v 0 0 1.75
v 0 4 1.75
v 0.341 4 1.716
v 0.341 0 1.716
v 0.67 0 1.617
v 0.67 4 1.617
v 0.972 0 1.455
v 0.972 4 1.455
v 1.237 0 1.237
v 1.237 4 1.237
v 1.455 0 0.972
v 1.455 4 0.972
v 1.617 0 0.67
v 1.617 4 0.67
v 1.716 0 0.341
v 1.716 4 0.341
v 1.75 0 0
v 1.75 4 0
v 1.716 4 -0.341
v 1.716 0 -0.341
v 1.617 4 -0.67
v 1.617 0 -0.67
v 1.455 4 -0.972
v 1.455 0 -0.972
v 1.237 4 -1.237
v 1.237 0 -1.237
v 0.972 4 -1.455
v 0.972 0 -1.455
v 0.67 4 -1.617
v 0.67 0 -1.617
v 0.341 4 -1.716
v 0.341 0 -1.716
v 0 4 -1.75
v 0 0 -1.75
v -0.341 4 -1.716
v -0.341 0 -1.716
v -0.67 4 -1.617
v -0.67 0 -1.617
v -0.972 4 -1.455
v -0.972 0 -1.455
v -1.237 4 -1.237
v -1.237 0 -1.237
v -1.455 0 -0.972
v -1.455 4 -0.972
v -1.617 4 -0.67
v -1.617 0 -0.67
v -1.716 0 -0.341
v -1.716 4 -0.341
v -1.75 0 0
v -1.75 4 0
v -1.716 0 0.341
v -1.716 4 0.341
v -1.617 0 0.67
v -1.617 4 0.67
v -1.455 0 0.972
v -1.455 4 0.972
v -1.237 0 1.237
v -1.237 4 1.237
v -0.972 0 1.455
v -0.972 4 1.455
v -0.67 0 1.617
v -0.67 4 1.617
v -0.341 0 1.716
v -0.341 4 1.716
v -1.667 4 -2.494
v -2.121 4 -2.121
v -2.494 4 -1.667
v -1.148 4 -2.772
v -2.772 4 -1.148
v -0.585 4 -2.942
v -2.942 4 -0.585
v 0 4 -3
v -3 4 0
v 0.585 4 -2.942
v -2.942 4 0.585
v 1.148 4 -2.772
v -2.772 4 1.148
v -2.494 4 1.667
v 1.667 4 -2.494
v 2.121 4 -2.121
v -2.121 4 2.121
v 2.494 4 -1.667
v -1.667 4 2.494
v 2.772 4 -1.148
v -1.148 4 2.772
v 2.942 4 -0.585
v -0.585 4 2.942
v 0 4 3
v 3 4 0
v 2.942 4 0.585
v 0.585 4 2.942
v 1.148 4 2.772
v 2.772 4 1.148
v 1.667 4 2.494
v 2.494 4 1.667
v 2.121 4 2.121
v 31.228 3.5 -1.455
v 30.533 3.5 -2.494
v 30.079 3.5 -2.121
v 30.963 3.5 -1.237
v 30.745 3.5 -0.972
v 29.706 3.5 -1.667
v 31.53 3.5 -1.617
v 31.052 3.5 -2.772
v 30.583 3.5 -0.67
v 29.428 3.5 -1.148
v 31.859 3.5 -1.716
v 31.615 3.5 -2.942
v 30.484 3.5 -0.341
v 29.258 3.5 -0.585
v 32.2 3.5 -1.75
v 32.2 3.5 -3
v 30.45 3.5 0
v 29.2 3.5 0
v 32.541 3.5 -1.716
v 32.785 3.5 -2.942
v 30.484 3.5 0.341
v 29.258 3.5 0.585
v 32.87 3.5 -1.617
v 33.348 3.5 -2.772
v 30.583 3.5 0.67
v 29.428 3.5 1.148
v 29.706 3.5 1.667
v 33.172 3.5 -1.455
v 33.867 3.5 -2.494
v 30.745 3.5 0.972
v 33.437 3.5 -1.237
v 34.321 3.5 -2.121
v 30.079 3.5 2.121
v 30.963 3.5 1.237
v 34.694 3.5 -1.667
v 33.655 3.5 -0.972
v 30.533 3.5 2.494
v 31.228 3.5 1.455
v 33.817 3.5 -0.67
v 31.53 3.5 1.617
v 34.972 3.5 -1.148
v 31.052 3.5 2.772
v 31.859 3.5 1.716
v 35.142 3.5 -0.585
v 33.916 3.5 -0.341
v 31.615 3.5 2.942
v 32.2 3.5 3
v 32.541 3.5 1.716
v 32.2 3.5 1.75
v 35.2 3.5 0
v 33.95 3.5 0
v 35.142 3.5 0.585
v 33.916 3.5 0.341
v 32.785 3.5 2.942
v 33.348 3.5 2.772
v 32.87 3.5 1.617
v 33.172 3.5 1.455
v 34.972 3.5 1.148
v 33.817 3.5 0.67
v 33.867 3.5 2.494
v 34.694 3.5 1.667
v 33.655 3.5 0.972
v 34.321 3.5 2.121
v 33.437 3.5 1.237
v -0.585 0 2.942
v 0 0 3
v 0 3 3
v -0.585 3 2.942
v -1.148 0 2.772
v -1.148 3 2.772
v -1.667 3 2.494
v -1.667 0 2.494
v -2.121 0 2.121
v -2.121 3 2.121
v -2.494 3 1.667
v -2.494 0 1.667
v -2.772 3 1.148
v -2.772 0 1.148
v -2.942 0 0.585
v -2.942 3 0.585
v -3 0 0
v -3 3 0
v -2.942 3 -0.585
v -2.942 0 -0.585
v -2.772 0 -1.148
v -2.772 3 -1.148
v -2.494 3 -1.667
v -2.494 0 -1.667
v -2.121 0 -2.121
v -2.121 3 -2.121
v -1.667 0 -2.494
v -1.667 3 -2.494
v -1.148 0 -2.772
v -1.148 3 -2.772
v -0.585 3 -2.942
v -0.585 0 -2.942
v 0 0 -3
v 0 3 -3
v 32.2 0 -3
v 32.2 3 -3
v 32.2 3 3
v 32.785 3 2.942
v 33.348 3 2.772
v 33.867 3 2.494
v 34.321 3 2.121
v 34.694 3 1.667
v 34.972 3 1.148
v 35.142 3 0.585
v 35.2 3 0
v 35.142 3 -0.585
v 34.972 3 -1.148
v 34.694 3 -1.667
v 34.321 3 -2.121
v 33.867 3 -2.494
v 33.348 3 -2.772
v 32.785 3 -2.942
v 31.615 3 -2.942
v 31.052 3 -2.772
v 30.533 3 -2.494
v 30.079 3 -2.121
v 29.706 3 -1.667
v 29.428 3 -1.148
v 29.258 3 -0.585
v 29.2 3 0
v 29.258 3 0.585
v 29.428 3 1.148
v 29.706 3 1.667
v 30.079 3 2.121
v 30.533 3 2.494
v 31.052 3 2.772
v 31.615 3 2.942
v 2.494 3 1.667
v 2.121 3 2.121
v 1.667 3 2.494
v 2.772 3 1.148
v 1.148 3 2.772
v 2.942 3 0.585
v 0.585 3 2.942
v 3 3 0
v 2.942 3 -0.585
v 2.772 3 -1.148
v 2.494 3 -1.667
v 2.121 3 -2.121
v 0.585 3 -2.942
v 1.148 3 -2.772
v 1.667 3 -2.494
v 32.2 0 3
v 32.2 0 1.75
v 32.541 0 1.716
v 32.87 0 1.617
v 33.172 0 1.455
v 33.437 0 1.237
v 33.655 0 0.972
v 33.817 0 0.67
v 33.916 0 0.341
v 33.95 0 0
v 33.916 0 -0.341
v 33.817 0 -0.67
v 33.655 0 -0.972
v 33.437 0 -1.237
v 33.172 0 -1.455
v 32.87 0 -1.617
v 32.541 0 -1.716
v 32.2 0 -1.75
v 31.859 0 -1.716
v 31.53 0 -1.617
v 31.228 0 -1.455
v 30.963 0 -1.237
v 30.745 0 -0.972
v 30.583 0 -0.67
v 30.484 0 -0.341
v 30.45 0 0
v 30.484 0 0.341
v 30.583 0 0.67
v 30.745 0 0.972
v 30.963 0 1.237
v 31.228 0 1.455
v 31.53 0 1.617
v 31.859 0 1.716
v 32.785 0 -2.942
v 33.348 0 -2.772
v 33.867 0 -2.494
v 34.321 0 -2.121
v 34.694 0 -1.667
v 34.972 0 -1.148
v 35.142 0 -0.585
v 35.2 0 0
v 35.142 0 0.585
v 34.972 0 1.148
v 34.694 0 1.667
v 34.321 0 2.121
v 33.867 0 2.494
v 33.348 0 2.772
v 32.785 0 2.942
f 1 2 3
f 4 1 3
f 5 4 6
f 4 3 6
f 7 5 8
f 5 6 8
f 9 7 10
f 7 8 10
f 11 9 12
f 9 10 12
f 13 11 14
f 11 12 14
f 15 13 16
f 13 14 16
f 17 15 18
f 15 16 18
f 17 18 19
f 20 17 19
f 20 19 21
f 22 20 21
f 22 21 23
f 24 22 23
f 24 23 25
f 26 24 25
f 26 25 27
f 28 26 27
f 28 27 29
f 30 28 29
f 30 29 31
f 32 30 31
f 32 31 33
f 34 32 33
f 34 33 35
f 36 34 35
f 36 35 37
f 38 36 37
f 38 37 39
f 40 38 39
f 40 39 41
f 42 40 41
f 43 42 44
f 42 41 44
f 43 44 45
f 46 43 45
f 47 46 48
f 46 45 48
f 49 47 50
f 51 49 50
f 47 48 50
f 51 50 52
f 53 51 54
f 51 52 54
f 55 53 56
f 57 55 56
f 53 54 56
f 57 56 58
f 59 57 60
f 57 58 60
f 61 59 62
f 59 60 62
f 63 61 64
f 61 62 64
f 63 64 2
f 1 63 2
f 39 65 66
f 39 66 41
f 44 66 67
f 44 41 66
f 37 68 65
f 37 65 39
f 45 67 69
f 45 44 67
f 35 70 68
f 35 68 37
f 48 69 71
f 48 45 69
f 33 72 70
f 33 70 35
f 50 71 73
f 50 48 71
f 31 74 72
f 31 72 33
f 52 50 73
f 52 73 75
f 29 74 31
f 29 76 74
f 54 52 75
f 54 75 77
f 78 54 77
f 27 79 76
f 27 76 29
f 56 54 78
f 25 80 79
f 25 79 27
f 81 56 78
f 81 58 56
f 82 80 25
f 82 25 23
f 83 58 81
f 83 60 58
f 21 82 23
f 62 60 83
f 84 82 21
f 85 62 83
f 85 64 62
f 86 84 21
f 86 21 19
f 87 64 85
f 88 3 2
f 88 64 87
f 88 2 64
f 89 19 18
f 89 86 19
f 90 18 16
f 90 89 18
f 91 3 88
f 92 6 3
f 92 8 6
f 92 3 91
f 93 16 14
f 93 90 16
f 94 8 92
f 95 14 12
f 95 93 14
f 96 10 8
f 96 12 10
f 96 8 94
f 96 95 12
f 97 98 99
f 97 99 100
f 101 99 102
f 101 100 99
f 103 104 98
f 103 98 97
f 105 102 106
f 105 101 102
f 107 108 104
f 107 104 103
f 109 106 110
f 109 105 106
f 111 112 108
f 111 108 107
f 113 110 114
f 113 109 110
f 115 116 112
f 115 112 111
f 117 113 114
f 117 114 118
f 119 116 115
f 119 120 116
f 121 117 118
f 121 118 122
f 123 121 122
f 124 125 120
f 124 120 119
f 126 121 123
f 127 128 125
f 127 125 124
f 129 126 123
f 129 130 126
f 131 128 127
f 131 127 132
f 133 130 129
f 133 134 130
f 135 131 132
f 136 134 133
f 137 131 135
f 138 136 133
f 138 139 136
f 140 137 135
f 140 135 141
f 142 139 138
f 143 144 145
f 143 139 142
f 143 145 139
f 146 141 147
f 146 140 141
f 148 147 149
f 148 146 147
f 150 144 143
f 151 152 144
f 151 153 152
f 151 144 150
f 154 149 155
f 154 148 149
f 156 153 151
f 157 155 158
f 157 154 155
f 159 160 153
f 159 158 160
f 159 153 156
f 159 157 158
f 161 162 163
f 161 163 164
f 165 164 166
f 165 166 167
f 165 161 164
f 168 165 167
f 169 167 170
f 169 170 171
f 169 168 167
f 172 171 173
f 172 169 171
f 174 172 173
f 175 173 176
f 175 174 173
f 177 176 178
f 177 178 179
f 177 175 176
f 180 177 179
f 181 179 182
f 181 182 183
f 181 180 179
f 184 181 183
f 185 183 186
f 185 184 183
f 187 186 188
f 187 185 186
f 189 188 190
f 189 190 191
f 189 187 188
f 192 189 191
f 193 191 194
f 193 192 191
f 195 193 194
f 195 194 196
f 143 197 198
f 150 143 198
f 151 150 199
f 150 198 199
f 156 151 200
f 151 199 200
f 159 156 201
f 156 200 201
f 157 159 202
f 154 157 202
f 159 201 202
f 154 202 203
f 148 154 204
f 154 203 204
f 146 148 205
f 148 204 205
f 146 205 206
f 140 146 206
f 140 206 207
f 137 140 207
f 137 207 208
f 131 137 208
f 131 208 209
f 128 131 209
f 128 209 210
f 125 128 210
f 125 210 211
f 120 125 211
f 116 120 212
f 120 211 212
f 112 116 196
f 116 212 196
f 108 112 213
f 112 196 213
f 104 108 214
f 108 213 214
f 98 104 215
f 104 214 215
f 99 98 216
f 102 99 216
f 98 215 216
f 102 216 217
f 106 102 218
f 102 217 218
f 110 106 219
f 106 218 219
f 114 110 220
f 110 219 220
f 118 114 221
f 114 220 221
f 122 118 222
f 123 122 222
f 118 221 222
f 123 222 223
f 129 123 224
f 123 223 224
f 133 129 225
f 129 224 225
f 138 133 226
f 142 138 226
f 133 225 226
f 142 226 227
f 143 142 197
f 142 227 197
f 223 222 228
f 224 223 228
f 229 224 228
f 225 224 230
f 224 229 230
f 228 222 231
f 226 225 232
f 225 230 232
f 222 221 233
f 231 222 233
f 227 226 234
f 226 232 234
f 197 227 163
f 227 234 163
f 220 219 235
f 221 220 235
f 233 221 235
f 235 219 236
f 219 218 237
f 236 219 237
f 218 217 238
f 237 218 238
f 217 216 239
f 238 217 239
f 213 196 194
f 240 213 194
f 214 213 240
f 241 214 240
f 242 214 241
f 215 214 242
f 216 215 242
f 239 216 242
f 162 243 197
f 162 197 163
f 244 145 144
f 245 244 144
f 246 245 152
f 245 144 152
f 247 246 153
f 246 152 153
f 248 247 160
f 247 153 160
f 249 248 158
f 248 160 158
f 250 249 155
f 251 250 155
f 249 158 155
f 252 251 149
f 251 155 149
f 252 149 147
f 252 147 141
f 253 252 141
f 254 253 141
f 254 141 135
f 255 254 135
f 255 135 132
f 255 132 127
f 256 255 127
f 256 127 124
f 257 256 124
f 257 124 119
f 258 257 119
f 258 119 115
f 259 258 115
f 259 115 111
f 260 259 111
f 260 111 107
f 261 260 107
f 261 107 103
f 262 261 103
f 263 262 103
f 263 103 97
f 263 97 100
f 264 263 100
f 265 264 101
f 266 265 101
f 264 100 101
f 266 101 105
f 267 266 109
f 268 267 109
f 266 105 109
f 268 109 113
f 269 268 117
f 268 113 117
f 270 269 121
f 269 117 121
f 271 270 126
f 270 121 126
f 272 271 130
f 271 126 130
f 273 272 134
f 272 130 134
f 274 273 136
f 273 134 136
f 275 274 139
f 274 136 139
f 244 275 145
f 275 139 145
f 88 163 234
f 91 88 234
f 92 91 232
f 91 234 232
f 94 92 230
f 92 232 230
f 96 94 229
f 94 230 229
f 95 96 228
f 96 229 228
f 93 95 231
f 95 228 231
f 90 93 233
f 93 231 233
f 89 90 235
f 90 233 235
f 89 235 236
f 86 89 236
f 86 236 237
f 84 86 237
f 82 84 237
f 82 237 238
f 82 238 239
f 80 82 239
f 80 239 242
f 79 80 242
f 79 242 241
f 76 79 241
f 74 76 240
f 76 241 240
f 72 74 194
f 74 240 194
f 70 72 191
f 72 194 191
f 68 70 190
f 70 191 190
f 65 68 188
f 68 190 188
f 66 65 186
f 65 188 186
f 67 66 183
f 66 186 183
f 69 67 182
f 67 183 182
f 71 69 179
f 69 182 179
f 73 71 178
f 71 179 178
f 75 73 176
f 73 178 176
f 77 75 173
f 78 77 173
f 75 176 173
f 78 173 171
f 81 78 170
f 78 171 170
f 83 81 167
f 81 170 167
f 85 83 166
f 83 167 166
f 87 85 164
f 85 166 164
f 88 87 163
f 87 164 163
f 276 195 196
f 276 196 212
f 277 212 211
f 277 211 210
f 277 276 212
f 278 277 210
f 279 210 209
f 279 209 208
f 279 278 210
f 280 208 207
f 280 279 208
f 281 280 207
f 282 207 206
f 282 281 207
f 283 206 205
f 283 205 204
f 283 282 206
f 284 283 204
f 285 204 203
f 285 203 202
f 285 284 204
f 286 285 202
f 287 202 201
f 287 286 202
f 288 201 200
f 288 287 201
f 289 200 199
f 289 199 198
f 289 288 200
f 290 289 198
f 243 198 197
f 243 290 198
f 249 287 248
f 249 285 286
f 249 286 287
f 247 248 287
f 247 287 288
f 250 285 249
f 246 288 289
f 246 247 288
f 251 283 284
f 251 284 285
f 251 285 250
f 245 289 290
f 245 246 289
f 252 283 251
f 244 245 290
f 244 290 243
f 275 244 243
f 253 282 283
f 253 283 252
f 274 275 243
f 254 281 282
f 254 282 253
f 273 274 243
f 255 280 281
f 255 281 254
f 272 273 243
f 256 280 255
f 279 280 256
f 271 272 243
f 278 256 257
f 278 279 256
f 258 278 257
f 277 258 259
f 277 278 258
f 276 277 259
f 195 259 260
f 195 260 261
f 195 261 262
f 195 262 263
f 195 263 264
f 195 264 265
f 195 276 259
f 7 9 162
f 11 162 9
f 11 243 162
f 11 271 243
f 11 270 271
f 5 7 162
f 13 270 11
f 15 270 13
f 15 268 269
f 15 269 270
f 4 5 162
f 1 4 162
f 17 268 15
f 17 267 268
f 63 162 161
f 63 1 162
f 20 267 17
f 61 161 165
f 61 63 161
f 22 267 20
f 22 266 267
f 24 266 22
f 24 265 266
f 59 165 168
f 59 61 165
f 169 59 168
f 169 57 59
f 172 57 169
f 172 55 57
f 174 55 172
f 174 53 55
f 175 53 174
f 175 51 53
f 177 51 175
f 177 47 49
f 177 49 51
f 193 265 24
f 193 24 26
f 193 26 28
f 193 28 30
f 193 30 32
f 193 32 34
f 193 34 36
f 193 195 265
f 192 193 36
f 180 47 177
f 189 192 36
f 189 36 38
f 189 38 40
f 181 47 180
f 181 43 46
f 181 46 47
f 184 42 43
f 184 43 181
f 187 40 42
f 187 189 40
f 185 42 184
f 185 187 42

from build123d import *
from build123d.topology import SkipClean

# Parameters (mm, degrees)
EXTRUDE_1_DEPTH     = 3
SKETCH_2_R          = 3
EXTRUDE_2_DEPTH     = 0.5
SKETCH_3_R          = 3
EXTRUDE_3_DEPTH     = 1
SKETCH_4_R          = 1.75
CUT_EXTRUDE_1_DEPTH = 36.553340209


with BuildPart() as part:
    # Эскиз1 → Бобышка-Вытянуть1 (new body)
    with BuildSketch(Plane(origin=(0, 0, 0), x_dir=(1, 0, 0), z_dir=(0, 1, 0))):
        with BuildLine():
            Line((0, 3), (32.2, 3))
            ThreePointArc((32.2, 3), (35.2, 0), (32.2, -3))
            Line((32.2, -3), (0, -3))
            ThreePointArc((0, -3), (-3, 0), (0, 3))
        make_face()
    extrude(amount=EXTRUDE_1_DEPTH)

    # Эскиз2 → Бобышка-Вытянуть2 (add)
    with SkipClean():  # the faces are left unmerged after this step: merging them gives an invalid solid
        with BuildSketch(Plane(origin=(0, 3, 0), x_dir=(1, 0, 0), z_dir=(0, 1, 0))):
            with Locations((32.2, 0)):
                Circle(SKETCH_2_R)
        extrude(amount=EXTRUDE_2_DEPTH)
    add(part.part.scale(1), mode=Mode.REPLACE)  # the faces are merged on a copy

    # Эскиз3 → Бобышка-Вытянуть3 (add)
    with BuildSketch(Plane(origin=(0, 3, 0), x_dir=(1, 0, 0), z_dir=(0, 1, 0))):
        Circle(SKETCH_3_R)
    extrude(amount=EXTRUDE_3_DEPTH)

    # Эскиз4 → Вырез-Вытянуть1 (cut, through all)
    with BuildSketch(Plane(origin=(0, 4, 0), x_dir=(1, 0, 0), z_dir=(0, 1, 0))):
        Circle(SKETCH_4_R)
        with Locations((32.2, 0)):
            Circle(SKETCH_4_R)
    extrude(amount=-CUT_EXTRUDE_1_DEPTH, mode=Mode.SUBTRACT)


solid = part.part
